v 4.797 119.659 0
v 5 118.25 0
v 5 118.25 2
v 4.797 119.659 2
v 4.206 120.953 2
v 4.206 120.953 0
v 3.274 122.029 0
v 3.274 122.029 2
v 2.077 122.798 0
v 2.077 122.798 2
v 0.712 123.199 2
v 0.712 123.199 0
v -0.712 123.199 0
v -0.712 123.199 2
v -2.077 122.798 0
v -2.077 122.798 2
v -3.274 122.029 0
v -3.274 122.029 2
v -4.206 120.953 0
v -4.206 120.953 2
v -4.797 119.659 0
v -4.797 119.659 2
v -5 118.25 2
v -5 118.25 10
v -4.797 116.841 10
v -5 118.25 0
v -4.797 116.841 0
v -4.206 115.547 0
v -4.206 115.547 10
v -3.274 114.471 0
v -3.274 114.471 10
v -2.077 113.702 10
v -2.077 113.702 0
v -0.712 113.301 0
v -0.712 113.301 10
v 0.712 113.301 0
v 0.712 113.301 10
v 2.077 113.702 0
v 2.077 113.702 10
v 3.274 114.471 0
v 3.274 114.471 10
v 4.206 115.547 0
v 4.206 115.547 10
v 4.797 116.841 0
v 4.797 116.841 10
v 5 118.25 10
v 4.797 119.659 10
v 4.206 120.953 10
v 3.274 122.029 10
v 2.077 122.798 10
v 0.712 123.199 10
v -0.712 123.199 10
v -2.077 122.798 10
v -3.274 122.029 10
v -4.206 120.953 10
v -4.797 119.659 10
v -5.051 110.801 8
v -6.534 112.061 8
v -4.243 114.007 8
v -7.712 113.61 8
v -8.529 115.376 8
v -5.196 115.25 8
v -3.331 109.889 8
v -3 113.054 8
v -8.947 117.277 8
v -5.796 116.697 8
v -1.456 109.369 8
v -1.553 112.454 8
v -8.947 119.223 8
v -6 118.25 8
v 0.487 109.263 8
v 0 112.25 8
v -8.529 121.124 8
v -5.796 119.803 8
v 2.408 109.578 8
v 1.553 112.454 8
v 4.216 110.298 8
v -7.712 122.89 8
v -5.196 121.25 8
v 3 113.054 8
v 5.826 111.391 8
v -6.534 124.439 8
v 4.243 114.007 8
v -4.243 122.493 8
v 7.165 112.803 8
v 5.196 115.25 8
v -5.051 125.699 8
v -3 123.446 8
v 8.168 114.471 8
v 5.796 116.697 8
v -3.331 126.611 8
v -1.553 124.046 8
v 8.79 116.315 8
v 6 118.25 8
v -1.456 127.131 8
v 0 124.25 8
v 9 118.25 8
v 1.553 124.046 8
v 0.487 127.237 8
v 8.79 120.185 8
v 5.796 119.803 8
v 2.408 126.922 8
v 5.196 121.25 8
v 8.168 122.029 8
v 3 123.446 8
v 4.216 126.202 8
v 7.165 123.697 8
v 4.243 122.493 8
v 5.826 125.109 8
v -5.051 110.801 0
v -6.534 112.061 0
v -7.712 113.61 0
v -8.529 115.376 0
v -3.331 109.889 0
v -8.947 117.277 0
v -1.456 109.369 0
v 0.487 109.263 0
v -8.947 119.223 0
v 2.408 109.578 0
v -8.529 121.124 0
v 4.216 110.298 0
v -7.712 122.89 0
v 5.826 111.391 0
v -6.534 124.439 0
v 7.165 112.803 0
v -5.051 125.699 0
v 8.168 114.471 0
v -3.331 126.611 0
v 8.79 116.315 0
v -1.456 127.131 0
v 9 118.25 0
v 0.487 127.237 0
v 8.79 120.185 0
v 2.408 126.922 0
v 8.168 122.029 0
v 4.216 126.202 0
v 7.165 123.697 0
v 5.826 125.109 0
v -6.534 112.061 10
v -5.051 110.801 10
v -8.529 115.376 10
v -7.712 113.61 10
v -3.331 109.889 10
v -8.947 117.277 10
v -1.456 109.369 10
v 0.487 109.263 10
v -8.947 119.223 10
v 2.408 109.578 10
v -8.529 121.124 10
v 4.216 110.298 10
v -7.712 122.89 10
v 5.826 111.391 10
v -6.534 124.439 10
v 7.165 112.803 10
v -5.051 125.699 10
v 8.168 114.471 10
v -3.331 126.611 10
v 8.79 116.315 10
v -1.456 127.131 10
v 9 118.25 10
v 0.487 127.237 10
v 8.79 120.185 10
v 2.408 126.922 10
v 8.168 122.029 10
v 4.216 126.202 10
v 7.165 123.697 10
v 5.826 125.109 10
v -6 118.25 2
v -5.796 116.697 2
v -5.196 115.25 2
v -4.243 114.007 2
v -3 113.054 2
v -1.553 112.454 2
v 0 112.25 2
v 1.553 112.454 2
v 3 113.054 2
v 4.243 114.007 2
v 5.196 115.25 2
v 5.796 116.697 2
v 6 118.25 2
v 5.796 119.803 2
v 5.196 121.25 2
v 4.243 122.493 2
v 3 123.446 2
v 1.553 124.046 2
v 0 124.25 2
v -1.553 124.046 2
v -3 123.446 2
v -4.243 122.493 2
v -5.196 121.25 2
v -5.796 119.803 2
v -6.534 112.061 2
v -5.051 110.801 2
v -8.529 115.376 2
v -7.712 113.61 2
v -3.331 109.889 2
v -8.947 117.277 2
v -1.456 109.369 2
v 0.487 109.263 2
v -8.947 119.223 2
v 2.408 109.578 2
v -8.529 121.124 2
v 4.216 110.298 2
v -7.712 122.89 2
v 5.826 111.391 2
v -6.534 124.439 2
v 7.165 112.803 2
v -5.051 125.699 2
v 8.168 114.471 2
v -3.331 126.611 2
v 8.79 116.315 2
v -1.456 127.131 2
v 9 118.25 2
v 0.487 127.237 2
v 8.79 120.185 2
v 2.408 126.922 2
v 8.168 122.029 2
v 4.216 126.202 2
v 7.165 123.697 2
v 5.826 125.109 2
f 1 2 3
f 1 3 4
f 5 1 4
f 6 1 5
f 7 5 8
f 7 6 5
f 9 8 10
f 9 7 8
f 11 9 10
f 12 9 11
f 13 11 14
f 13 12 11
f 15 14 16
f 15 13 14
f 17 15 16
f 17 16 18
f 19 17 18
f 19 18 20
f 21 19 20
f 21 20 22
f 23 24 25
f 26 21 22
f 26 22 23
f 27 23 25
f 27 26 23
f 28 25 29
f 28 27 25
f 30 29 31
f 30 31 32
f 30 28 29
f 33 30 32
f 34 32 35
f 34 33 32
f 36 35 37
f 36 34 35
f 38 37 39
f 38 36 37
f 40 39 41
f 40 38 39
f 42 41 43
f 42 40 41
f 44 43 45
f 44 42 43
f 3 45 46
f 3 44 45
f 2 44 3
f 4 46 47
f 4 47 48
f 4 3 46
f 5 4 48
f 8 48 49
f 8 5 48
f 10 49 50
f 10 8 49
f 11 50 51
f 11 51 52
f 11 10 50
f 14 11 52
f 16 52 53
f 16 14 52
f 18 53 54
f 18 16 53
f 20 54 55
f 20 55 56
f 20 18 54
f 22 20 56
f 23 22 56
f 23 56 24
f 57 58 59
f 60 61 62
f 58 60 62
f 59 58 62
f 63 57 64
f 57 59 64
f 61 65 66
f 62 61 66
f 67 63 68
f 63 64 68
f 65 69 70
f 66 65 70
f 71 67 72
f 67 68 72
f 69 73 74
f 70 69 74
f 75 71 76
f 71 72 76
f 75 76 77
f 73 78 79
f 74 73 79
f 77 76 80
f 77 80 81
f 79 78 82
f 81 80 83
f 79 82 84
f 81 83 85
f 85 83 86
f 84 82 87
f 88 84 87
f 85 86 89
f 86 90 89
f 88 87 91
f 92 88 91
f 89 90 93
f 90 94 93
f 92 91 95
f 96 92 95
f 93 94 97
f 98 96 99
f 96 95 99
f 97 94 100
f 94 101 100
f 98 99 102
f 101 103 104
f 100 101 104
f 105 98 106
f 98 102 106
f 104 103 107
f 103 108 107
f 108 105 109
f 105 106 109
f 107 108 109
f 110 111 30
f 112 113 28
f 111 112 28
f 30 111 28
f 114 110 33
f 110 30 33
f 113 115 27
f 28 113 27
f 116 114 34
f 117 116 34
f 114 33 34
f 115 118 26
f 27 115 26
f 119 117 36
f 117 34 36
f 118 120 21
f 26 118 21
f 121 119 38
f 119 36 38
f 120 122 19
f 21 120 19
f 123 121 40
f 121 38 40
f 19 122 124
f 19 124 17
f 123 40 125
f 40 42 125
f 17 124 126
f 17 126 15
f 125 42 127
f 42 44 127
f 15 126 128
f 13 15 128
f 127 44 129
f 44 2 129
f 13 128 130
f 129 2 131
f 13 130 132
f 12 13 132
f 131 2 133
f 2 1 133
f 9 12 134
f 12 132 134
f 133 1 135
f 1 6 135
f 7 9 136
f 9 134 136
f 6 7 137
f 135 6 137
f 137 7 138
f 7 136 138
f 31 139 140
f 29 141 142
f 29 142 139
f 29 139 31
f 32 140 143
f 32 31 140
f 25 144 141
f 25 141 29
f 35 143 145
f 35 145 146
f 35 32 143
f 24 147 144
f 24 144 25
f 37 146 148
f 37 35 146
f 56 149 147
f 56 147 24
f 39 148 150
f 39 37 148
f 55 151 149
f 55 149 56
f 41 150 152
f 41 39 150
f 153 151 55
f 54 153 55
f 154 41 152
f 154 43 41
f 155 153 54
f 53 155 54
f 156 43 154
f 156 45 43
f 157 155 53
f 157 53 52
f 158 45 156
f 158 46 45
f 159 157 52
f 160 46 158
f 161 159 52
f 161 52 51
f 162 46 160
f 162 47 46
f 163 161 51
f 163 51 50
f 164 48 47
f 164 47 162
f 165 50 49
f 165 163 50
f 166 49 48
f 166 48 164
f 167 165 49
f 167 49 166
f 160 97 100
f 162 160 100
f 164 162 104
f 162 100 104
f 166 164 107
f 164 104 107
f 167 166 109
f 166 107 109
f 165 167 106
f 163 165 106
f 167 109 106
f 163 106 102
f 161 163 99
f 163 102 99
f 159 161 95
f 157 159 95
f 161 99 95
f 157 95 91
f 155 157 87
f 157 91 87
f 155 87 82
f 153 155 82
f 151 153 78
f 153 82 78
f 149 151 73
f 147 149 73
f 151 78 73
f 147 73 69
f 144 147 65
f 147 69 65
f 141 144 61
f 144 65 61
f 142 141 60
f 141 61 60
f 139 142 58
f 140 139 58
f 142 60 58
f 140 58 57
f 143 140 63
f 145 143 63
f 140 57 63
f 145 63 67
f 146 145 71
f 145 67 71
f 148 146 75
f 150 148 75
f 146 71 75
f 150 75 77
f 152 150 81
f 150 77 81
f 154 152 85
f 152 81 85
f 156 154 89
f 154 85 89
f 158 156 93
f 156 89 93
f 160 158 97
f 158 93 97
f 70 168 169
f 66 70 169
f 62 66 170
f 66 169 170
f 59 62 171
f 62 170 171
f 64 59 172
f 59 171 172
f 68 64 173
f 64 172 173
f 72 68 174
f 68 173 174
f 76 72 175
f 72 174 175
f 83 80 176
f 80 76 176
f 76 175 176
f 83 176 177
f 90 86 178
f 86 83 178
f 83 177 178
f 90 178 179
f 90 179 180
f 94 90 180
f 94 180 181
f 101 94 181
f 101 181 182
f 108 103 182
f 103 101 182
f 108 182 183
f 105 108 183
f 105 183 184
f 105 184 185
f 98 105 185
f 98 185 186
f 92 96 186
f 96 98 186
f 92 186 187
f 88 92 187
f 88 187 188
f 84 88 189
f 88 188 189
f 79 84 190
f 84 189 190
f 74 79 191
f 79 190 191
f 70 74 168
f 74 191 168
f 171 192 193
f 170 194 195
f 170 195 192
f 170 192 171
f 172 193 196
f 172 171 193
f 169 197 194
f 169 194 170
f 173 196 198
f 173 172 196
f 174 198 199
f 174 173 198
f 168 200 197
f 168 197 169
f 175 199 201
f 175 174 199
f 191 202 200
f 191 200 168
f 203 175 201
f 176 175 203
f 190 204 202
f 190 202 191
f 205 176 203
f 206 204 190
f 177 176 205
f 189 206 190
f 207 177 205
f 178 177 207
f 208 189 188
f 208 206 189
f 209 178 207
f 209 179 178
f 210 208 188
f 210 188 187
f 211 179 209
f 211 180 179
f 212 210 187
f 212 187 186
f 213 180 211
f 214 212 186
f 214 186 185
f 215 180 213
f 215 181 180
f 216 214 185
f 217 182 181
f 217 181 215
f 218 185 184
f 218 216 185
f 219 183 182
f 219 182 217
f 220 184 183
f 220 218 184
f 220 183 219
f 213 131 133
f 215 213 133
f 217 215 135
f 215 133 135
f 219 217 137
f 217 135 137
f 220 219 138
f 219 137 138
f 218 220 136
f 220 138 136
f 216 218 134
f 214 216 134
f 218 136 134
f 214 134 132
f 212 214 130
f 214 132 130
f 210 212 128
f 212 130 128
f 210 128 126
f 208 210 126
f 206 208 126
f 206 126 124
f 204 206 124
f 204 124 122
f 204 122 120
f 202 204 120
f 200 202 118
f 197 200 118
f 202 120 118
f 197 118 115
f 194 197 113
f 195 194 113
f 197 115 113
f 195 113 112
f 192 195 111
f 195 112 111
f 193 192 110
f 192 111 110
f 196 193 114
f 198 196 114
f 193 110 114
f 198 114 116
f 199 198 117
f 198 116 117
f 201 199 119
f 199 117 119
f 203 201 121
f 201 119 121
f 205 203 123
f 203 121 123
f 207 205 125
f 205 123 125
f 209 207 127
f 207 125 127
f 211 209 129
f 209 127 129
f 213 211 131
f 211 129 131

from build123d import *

# Parameters (mm, degrees)
SKETCH_1_R      = 9
SKETCH_1_R_2    = 5
EXTRUDE_1_DEPTH = 2
SKETCH_2_R      = 6
SKETCH_2_R_2    = 5
EXTRUDE_2_DEPTH = 8
EXTRUDE_START   = -2
SKETCH_3_R      = 9
SKETCH_3_R_2    = 5
EXTRUDE_3_DEPTH = 2


with BuildPart() as part:
    # 草图1 → 凸台-拉伸1 (new body)
    with BuildSketch(Plane.XY):
        with Locations((0, 118.25)):
            Circle(SKETCH_1_R)
        with Locations((0, 118.25)):
            Circle(SKETCH_1_R_2, mode=Mode.SUBTRACT)
    extrude(amount=EXTRUDE_1_DEPTH)

    # 草图2 → 凸台-拉伸2 (add)
    with BuildSketch(Plane.XY.offset(2)):
        with Locations(Location((0, 118.25, 0), (0, 0, 180))):
            Circle(SKETCH_2_R)
        with Locations(Location((0, 118.25, 0), (0, 0, 180))):
            Circle(SKETCH_2_R_2, mode=Mode.SUBTRACT)
    extrude(amount=EXTRUDE_2_DEPTH)

    # 草图3 → 凸台-拉伸3 (add)
    with BuildSketch(Plane.XY.offset(10).offset(EXTRUDE_START)):
        with Locations((0, 118.25)):
            Circle(SKETCH_3_R)
        with Locations(Location((0, 118.25, 0), (0, 0, 180))):
            Circle(SKETCH_3_R_2, mode=Mode.SUBTRACT)
    extrude(amount=EXTRUDE_3_DEPTH)


solid = part.part
